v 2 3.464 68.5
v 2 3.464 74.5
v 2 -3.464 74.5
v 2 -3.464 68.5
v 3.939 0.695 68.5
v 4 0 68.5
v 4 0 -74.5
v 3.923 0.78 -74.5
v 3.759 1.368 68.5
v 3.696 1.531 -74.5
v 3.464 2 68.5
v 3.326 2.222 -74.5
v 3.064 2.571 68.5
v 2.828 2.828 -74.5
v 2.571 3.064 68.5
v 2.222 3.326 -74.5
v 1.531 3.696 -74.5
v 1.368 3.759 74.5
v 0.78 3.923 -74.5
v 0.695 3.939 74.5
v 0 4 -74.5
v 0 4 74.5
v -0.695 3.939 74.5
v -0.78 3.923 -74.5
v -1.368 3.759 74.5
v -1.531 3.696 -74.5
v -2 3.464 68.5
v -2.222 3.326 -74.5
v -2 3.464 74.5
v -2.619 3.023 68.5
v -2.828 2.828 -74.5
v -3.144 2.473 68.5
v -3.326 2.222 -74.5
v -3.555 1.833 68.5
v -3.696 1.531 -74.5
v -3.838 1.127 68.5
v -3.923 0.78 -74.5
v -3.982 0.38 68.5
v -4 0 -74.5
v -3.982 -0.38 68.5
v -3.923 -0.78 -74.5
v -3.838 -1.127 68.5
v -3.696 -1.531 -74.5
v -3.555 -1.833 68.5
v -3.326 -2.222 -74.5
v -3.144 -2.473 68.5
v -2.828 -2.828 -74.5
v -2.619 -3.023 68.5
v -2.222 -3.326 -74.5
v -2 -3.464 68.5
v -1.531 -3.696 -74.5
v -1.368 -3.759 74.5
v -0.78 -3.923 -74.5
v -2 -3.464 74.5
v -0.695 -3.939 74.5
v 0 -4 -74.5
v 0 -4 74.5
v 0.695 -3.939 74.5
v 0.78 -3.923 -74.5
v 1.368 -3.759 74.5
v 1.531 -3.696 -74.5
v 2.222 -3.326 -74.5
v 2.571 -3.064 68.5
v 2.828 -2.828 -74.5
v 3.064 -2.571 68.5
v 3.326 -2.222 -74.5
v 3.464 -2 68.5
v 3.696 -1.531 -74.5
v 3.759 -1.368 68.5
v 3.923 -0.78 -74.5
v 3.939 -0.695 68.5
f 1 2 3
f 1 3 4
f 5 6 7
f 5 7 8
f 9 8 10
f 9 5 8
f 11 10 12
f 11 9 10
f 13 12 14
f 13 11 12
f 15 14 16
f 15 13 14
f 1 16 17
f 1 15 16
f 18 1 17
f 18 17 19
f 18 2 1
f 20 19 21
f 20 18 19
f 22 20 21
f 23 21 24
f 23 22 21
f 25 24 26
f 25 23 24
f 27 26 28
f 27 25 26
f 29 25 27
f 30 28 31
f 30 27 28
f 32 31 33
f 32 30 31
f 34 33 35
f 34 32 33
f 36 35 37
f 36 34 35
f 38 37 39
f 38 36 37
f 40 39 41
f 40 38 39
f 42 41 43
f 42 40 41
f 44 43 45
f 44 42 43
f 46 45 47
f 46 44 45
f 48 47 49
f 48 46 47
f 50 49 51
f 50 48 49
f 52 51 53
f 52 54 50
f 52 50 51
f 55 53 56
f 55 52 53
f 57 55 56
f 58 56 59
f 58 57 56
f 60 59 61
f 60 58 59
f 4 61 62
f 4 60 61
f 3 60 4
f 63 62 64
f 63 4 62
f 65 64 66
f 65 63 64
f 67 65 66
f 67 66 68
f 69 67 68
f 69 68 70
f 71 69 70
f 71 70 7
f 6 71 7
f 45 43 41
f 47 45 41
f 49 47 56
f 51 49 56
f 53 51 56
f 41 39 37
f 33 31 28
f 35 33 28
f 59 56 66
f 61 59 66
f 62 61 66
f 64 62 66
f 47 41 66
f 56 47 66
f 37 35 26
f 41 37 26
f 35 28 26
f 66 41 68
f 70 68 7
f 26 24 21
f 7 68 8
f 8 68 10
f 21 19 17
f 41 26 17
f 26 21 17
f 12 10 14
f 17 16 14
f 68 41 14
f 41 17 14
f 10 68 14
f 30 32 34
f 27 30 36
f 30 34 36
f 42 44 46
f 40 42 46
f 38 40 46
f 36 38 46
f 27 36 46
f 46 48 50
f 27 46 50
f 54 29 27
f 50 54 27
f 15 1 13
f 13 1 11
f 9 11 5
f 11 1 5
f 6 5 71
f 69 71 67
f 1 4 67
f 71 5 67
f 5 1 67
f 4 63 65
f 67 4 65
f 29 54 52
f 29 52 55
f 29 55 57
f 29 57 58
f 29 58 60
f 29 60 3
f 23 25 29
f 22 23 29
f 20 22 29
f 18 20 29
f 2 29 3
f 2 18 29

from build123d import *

# Parameters (mm, degrees)
SKETCH_1_R               = 4
EXTRUDE_1_DEPTH          = 74.5
CUT_EXTRUDE_1_DEPTH      = 75.714456432
CUT_EXTRUDE_1_DEPTH_BACK = 75.714456432
SKETCH_2_W               = 2
SKETCH_2_H               = 6


with BuildPart() as part:
    # 草图1 → 凸台-拉伸1 (new, symmetric)
    with BuildSketch(Plane.XY):
        Circle(SKETCH_1_R)
    extrude(amount=EXTRUDE_1_DEPTH, both=True)

    # 草图2 → 切除-拉伸1 (cut, two sides: drawn at the far end of the back side and taken through both)
    with BuildSketch(Plane(origin=(0, 0, 0), x_dir=(1, 0, 0), z_dir=(0, 1, 0)).offset(-CUT_EXTRUDE_1_DEPTH_BACK)):
        with Locations((-3, -71.5)):
            Rectangle(SKETCH_2_W, SKETCH_2_H)
        with Locations((3, -71.5)):
            Rectangle(SKETCH_2_W, SKETCH_2_H)
    extrude(amount=CUT_EXTRUDE_1_DEPTH + CUT_EXTRUDE_1_DEPTH_BACK, mode=Mode.SUBTRACT)


solid = part.part
